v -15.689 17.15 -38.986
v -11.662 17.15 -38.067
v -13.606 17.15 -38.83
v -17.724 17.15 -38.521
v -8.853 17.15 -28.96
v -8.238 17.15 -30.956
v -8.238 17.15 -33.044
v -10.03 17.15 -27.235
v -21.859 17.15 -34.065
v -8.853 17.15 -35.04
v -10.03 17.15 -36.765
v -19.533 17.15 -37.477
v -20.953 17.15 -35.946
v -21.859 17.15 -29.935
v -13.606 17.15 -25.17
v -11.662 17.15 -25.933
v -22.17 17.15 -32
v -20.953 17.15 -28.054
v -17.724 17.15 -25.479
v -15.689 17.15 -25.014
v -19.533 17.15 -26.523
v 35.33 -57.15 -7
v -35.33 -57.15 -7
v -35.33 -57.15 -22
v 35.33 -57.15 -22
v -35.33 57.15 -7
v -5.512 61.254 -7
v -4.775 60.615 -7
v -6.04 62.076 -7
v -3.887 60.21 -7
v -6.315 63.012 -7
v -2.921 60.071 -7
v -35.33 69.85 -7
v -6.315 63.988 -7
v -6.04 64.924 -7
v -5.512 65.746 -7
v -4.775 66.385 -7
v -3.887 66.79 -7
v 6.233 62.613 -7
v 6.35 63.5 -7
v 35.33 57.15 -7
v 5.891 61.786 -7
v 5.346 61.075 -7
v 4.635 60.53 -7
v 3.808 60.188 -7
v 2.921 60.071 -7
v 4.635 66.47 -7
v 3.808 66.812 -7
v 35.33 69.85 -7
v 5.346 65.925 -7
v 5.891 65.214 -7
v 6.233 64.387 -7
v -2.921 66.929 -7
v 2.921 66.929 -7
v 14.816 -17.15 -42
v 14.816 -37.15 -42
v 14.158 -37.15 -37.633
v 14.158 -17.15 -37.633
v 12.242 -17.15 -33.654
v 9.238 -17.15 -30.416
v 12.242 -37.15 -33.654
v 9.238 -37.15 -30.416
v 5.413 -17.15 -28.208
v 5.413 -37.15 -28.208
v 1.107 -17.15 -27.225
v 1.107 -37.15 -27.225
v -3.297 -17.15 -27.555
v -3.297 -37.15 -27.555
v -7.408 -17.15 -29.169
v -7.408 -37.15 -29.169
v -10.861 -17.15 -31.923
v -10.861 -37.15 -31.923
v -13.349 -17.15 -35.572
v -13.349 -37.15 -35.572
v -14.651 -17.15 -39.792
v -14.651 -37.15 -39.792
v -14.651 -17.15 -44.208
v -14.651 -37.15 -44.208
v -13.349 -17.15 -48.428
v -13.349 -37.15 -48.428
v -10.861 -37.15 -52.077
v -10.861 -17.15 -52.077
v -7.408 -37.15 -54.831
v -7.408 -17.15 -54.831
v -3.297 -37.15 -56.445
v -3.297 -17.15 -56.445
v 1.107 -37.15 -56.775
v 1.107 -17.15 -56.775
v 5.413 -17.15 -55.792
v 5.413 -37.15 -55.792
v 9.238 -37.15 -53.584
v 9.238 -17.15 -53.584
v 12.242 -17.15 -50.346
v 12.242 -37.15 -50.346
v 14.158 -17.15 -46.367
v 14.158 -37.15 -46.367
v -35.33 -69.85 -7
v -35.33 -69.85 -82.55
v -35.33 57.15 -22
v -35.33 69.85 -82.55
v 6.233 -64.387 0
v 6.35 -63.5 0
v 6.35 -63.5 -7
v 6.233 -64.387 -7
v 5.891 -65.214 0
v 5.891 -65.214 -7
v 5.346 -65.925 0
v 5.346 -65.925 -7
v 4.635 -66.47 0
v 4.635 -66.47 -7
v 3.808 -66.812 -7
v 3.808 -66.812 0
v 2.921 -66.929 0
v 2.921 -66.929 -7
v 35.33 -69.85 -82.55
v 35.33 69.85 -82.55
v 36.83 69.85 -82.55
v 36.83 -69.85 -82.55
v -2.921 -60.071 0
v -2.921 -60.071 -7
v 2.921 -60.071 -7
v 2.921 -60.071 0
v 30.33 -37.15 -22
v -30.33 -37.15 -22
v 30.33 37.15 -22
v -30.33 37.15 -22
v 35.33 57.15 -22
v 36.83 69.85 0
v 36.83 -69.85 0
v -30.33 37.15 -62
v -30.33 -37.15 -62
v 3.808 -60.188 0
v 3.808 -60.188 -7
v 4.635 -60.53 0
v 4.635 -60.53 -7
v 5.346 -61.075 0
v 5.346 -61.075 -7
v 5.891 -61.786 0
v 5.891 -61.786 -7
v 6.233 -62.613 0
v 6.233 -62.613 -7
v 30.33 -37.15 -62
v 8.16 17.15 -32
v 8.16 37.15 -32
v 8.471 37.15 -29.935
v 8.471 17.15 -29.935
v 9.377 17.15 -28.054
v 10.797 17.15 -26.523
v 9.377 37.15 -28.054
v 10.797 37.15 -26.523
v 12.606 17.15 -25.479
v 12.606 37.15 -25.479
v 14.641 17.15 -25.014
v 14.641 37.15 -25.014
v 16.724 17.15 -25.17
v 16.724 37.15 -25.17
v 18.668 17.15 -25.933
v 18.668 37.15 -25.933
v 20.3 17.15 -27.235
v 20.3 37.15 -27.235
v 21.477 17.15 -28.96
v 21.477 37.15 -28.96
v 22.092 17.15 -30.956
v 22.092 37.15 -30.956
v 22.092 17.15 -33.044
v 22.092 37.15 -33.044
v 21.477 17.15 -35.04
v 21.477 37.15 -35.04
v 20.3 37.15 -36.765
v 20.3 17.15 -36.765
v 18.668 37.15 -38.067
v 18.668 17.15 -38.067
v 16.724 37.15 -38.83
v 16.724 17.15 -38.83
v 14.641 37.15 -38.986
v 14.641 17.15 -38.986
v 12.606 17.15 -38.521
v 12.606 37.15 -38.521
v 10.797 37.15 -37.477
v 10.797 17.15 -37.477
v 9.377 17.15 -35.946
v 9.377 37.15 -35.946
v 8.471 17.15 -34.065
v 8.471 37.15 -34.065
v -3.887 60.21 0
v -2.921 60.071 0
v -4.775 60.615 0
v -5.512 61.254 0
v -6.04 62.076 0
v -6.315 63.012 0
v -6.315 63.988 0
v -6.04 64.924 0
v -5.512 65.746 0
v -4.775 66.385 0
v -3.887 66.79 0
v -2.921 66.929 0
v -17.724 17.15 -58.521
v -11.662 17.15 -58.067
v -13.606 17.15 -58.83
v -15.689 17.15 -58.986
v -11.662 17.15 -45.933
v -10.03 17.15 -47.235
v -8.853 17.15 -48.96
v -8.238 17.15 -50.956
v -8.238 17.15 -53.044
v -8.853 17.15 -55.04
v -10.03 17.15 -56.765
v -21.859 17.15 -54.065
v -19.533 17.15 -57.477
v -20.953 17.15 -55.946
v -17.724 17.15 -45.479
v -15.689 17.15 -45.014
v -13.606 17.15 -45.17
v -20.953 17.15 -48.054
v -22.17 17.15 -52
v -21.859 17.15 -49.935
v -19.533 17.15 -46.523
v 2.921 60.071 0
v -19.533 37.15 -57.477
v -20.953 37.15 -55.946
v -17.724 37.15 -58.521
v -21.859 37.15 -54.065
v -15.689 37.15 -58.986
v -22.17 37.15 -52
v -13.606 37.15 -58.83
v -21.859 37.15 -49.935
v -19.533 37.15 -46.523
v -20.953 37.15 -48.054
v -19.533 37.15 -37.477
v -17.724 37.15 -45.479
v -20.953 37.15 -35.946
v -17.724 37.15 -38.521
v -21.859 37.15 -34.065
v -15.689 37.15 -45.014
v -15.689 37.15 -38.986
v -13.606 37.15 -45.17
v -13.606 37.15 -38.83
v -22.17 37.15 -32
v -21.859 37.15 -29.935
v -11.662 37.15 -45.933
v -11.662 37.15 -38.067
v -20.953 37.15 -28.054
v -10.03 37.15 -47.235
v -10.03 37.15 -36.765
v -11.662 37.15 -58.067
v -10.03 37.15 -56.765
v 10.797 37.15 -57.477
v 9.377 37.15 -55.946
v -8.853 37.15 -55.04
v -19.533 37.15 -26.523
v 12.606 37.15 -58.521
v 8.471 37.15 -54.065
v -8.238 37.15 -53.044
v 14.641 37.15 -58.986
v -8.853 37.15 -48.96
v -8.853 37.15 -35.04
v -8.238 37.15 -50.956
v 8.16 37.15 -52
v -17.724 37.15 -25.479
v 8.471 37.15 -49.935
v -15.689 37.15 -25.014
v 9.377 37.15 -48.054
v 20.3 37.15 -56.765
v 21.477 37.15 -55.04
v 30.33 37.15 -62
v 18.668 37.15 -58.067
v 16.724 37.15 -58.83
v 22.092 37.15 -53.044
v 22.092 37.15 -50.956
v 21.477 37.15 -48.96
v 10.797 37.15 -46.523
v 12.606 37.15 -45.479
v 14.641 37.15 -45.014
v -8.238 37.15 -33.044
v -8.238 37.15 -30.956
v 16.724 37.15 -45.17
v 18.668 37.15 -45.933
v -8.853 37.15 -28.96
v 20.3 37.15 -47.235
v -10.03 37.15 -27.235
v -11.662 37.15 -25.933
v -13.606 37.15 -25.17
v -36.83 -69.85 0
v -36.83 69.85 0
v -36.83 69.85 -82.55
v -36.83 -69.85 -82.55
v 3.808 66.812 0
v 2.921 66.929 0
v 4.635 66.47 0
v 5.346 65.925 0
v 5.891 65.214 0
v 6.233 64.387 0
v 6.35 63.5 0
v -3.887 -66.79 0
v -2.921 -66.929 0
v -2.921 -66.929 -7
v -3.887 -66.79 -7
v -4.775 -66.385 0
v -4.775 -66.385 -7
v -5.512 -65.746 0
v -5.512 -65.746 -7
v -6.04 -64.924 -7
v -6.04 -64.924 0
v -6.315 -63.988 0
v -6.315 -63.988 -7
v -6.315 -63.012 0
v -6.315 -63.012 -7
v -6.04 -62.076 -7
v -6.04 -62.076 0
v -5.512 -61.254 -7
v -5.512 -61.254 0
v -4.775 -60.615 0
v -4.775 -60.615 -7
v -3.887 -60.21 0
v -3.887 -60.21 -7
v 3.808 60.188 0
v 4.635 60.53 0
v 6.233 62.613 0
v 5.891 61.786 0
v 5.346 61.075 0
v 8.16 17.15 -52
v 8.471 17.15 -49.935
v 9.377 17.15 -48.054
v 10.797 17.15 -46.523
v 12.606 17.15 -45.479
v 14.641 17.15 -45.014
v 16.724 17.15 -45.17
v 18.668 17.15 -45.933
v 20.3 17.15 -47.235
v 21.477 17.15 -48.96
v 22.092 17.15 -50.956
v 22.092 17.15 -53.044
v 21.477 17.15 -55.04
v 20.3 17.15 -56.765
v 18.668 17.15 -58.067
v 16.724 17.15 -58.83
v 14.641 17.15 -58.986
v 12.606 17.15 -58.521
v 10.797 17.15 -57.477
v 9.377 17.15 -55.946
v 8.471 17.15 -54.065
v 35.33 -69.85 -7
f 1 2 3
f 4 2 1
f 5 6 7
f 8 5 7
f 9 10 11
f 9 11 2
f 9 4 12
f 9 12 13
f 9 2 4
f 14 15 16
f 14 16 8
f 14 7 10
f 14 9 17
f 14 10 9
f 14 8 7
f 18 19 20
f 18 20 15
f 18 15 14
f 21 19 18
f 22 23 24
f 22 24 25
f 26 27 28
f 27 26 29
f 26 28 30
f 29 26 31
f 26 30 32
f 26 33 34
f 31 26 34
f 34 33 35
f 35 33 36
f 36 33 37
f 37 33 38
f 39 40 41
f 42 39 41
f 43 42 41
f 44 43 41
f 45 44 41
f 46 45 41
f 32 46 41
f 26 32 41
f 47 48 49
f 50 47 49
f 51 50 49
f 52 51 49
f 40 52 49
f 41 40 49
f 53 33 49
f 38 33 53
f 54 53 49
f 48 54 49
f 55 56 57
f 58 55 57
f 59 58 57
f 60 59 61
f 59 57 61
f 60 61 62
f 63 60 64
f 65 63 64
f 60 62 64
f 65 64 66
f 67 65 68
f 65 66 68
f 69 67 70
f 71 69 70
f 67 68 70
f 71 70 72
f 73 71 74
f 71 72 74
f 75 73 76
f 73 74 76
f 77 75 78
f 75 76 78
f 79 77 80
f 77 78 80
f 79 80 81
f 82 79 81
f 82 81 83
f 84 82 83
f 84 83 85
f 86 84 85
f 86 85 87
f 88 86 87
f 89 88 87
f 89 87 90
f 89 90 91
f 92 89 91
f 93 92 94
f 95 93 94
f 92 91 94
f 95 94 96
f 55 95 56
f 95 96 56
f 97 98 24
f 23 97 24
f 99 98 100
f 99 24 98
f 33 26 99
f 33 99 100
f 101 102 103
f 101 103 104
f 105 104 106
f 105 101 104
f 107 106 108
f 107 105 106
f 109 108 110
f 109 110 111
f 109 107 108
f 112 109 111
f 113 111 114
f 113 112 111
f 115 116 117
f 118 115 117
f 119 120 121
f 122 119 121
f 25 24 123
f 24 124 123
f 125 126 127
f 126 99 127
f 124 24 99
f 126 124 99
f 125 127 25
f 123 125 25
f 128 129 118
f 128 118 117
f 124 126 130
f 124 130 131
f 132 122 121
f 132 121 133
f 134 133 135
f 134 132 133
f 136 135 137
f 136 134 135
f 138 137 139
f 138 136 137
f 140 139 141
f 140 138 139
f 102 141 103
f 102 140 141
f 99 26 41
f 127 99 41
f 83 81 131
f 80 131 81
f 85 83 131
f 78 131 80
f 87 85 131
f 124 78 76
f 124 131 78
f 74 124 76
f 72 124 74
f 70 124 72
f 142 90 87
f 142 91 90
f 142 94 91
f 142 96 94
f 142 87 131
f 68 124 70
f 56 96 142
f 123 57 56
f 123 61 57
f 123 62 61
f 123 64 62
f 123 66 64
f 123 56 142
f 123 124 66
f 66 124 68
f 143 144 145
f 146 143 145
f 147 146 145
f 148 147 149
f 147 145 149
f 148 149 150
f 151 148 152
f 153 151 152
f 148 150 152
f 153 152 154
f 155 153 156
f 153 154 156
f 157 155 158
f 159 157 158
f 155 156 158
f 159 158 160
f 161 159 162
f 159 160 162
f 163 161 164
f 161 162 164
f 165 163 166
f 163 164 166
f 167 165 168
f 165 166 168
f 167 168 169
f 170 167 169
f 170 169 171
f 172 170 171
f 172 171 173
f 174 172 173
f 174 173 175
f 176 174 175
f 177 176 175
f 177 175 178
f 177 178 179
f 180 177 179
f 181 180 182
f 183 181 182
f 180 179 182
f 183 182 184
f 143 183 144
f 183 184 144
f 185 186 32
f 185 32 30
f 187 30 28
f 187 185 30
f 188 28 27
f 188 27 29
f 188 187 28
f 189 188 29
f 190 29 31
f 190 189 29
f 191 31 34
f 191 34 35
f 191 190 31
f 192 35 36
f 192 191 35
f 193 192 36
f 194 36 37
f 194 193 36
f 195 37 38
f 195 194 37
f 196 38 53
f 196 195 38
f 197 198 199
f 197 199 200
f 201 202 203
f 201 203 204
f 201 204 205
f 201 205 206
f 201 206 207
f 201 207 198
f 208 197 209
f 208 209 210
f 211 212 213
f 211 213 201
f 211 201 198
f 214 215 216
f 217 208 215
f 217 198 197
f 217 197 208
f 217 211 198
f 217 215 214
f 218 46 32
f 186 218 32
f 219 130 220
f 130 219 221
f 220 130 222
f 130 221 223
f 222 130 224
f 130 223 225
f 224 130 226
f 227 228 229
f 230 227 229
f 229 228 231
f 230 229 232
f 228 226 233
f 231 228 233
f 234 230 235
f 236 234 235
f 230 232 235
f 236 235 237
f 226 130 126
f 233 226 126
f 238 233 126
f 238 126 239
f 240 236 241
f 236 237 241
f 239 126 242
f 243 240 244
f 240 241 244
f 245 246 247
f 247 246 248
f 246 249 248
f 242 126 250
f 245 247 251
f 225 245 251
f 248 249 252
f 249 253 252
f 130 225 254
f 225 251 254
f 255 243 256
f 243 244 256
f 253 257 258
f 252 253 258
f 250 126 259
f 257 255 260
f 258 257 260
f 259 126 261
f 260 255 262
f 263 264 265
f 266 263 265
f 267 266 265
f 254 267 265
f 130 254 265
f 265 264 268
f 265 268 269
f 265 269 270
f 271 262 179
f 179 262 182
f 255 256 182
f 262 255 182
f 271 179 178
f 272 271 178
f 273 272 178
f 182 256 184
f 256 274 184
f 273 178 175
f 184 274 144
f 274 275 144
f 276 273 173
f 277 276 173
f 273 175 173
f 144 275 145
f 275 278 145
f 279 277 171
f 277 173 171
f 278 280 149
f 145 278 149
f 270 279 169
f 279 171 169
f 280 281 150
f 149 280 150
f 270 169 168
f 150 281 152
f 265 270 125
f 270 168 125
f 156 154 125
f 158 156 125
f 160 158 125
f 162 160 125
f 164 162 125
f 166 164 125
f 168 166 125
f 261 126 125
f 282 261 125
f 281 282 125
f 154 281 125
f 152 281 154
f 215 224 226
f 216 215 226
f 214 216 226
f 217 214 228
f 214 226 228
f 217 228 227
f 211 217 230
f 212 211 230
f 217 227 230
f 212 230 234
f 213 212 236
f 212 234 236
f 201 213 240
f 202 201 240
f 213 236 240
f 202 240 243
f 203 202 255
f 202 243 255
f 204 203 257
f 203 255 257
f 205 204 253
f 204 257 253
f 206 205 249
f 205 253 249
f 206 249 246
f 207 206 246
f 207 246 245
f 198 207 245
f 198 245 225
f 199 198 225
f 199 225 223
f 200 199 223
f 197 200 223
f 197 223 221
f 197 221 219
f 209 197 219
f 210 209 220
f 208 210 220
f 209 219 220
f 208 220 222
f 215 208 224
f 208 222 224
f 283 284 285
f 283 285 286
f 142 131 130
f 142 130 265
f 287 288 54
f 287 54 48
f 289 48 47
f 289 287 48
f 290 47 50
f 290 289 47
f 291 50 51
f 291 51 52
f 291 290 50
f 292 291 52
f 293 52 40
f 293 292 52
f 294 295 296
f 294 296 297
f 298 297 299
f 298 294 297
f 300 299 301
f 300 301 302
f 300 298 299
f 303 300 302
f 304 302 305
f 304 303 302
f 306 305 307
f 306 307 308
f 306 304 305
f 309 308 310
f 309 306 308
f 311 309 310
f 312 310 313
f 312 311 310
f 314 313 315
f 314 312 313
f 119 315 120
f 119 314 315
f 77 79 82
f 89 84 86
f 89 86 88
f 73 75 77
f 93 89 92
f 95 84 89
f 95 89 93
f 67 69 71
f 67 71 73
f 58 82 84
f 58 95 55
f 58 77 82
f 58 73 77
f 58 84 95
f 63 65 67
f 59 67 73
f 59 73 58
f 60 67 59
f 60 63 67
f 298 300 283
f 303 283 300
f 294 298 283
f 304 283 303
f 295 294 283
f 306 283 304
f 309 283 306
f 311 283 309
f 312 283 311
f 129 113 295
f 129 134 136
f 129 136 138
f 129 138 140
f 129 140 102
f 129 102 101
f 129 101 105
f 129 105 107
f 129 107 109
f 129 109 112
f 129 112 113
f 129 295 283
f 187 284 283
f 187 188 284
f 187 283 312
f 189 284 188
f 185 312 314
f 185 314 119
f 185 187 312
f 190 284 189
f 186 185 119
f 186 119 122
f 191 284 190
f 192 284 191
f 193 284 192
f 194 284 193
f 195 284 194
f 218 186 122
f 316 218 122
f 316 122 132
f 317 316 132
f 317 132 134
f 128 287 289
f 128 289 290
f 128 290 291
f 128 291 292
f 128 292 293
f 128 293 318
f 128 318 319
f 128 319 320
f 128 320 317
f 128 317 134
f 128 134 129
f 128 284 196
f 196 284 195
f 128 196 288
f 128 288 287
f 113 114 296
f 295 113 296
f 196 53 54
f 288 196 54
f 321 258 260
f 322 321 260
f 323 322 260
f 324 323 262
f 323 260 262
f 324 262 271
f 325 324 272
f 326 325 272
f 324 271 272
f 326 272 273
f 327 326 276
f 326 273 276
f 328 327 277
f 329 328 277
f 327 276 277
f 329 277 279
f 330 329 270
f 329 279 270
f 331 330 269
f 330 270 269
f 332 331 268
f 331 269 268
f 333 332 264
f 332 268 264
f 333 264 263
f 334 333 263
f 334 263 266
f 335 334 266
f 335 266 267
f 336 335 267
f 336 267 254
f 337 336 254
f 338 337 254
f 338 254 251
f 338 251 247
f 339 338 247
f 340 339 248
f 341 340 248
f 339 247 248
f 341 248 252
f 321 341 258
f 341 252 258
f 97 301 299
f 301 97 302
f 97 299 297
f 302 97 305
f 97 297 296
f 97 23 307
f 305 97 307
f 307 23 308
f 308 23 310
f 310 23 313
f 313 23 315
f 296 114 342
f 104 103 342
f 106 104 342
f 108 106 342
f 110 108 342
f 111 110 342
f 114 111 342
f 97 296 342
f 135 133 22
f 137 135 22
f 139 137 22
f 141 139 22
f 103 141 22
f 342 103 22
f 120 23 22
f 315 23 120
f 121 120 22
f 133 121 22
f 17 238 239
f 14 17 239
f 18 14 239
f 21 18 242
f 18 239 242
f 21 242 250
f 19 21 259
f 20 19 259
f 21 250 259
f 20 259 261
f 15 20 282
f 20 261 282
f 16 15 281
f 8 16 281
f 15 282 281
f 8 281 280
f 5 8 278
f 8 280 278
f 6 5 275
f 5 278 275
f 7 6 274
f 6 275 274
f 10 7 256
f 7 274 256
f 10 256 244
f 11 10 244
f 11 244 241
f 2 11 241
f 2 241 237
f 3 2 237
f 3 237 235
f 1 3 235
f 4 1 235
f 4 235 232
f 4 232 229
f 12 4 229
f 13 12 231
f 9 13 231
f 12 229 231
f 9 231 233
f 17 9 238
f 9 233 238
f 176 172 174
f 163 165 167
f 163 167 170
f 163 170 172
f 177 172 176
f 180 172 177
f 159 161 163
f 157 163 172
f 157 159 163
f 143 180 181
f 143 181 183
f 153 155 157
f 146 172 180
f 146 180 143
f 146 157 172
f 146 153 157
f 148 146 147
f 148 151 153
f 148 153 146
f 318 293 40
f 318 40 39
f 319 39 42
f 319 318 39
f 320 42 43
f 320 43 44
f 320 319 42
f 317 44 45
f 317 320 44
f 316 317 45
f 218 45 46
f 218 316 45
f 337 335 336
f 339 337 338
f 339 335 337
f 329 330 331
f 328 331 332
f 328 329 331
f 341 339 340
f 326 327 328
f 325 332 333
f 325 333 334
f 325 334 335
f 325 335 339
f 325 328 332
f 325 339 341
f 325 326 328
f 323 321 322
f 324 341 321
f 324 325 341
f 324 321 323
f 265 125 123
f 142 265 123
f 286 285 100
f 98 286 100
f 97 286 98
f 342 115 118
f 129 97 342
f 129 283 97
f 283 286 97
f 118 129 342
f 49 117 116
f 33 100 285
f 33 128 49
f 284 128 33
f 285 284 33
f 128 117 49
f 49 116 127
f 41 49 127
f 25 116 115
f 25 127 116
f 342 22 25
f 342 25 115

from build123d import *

# Parameters (mm, degrees)
F0_W     = 70.66
F0_H     = 114.3
F1_DEPTH = 22
F0_H_2   = 12.7
F2_DEPTH = 7
F3_DEPTH = 82.55
F4_W     = 60.66
F4_H     = 74.3
F5_DEPTH = 40
F6_R     = 14.816073
F7_DEPTH = 20
F8_R     = 7.005396
F9_DEPTH = 20


with BuildPart() as f1:
    # F0 (on Top) → F1 (new body)
    with BuildSketch(Plane.XY):
        Rectangle(F0_W, F0_H)
    extrude(amount=-F1_DEPTH)

    # F0 (on Top) → F2 (join)
    with BuildSketch(Plane.XY):
        with Locations((0, -63.5)):
            Rectangle(F0_W, F0_H_2)
        with BuildLine():
            ThreePointArc((-2.921, -66.929), (-6.35, -63.5), (-2.921, -60.071))
            Line((-2.921, -60.071), (2.921, -60.071))
            ThreePointArc((2.921, -60.071), (5.345669, -61.075331), (6.35, -63.5))
            ThreePointArc((6.35, -63.5), (5.345669, -65.924669), (2.921, -66.929))
            Line((2.921, -66.929), (-2.921, -66.929))
        make_face(mode=Mode.SUBTRACT)
        with Locations((0, 63.5)):
            Rectangle(F0_W, F0_H_2)
        with BuildLine():
            ThreePointArc((2.921, 66.929), (5.345669, 65.924669), (6.35, 63.5))
            ThreePointArc((6.35, 63.5), (5.345669, 61.075331), (2.921, 60.071))
            Line((2.921, 60.071), (-2.921, 60.071))
            ThreePointArc((-2.921, 60.071), (-6.35, 63.5), (-2.921, 66.929))
            Line((-2.921, 66.929), (2.921, 66.929))
        make_face(mode=Mode.SUBTRACT)
    extrude(amount=-F2_DEPTH)

    # F0 (on Top) → F3 (join)
    with BuildSketch(Plane.XY):
        Polygon((-35.33, 69.85), (-36.83, 69.85), (-36.83, -69.85), (-35.33, -69.85), (-35.33, -57.15), (-35.33, 57.15), align=None)
        Polygon((36.83, 69.85), (35.33, 69.85), (35.33, 57.15), (35.33, -57.15), (35.33, -69.85), (36.83, -69.85), align=None)
    extrude(amount=-F3_DEPTH)

    # F4 (on face) → F5 (join)
    with BuildSketch(Plane(origin=(0, 0, -22), x_dir=(1, 0, 0), z_dir=(0, 0, -1))):
        Rectangle(F4_W, F4_H)
    extrude(amount=F5_DEPTH)

    # F6 (on face) → F7 (cut)
    with BuildSketch(Plane.XZ.offset(37.15)):
        with Locations((0, -42)):
            Circle(F6_R)
    extrude(amount=-F7_DEPTH, mode=Mode.SUBTRACT)

    # F8 (on face) → F9 (cut)
    with BuildSketch(Plane(origin=(0, 37.15, 0), x_dir=(-1, 0, 0), z_dir=(0, 1, 0))):
        with Locations((15.165, -32)):
            Circle(F8_R)
        with Locations((15.165, -52)):
            Circle(F8_R)
        with Locations((-15.165, -52)):
            Circle(F8_R)
        with Locations((-15.165, -32)):
            Circle(F8_R)
    extrude(amount=-F9_DEPTH, mode=Mode.SUBTRACT)


solid = f1.part
